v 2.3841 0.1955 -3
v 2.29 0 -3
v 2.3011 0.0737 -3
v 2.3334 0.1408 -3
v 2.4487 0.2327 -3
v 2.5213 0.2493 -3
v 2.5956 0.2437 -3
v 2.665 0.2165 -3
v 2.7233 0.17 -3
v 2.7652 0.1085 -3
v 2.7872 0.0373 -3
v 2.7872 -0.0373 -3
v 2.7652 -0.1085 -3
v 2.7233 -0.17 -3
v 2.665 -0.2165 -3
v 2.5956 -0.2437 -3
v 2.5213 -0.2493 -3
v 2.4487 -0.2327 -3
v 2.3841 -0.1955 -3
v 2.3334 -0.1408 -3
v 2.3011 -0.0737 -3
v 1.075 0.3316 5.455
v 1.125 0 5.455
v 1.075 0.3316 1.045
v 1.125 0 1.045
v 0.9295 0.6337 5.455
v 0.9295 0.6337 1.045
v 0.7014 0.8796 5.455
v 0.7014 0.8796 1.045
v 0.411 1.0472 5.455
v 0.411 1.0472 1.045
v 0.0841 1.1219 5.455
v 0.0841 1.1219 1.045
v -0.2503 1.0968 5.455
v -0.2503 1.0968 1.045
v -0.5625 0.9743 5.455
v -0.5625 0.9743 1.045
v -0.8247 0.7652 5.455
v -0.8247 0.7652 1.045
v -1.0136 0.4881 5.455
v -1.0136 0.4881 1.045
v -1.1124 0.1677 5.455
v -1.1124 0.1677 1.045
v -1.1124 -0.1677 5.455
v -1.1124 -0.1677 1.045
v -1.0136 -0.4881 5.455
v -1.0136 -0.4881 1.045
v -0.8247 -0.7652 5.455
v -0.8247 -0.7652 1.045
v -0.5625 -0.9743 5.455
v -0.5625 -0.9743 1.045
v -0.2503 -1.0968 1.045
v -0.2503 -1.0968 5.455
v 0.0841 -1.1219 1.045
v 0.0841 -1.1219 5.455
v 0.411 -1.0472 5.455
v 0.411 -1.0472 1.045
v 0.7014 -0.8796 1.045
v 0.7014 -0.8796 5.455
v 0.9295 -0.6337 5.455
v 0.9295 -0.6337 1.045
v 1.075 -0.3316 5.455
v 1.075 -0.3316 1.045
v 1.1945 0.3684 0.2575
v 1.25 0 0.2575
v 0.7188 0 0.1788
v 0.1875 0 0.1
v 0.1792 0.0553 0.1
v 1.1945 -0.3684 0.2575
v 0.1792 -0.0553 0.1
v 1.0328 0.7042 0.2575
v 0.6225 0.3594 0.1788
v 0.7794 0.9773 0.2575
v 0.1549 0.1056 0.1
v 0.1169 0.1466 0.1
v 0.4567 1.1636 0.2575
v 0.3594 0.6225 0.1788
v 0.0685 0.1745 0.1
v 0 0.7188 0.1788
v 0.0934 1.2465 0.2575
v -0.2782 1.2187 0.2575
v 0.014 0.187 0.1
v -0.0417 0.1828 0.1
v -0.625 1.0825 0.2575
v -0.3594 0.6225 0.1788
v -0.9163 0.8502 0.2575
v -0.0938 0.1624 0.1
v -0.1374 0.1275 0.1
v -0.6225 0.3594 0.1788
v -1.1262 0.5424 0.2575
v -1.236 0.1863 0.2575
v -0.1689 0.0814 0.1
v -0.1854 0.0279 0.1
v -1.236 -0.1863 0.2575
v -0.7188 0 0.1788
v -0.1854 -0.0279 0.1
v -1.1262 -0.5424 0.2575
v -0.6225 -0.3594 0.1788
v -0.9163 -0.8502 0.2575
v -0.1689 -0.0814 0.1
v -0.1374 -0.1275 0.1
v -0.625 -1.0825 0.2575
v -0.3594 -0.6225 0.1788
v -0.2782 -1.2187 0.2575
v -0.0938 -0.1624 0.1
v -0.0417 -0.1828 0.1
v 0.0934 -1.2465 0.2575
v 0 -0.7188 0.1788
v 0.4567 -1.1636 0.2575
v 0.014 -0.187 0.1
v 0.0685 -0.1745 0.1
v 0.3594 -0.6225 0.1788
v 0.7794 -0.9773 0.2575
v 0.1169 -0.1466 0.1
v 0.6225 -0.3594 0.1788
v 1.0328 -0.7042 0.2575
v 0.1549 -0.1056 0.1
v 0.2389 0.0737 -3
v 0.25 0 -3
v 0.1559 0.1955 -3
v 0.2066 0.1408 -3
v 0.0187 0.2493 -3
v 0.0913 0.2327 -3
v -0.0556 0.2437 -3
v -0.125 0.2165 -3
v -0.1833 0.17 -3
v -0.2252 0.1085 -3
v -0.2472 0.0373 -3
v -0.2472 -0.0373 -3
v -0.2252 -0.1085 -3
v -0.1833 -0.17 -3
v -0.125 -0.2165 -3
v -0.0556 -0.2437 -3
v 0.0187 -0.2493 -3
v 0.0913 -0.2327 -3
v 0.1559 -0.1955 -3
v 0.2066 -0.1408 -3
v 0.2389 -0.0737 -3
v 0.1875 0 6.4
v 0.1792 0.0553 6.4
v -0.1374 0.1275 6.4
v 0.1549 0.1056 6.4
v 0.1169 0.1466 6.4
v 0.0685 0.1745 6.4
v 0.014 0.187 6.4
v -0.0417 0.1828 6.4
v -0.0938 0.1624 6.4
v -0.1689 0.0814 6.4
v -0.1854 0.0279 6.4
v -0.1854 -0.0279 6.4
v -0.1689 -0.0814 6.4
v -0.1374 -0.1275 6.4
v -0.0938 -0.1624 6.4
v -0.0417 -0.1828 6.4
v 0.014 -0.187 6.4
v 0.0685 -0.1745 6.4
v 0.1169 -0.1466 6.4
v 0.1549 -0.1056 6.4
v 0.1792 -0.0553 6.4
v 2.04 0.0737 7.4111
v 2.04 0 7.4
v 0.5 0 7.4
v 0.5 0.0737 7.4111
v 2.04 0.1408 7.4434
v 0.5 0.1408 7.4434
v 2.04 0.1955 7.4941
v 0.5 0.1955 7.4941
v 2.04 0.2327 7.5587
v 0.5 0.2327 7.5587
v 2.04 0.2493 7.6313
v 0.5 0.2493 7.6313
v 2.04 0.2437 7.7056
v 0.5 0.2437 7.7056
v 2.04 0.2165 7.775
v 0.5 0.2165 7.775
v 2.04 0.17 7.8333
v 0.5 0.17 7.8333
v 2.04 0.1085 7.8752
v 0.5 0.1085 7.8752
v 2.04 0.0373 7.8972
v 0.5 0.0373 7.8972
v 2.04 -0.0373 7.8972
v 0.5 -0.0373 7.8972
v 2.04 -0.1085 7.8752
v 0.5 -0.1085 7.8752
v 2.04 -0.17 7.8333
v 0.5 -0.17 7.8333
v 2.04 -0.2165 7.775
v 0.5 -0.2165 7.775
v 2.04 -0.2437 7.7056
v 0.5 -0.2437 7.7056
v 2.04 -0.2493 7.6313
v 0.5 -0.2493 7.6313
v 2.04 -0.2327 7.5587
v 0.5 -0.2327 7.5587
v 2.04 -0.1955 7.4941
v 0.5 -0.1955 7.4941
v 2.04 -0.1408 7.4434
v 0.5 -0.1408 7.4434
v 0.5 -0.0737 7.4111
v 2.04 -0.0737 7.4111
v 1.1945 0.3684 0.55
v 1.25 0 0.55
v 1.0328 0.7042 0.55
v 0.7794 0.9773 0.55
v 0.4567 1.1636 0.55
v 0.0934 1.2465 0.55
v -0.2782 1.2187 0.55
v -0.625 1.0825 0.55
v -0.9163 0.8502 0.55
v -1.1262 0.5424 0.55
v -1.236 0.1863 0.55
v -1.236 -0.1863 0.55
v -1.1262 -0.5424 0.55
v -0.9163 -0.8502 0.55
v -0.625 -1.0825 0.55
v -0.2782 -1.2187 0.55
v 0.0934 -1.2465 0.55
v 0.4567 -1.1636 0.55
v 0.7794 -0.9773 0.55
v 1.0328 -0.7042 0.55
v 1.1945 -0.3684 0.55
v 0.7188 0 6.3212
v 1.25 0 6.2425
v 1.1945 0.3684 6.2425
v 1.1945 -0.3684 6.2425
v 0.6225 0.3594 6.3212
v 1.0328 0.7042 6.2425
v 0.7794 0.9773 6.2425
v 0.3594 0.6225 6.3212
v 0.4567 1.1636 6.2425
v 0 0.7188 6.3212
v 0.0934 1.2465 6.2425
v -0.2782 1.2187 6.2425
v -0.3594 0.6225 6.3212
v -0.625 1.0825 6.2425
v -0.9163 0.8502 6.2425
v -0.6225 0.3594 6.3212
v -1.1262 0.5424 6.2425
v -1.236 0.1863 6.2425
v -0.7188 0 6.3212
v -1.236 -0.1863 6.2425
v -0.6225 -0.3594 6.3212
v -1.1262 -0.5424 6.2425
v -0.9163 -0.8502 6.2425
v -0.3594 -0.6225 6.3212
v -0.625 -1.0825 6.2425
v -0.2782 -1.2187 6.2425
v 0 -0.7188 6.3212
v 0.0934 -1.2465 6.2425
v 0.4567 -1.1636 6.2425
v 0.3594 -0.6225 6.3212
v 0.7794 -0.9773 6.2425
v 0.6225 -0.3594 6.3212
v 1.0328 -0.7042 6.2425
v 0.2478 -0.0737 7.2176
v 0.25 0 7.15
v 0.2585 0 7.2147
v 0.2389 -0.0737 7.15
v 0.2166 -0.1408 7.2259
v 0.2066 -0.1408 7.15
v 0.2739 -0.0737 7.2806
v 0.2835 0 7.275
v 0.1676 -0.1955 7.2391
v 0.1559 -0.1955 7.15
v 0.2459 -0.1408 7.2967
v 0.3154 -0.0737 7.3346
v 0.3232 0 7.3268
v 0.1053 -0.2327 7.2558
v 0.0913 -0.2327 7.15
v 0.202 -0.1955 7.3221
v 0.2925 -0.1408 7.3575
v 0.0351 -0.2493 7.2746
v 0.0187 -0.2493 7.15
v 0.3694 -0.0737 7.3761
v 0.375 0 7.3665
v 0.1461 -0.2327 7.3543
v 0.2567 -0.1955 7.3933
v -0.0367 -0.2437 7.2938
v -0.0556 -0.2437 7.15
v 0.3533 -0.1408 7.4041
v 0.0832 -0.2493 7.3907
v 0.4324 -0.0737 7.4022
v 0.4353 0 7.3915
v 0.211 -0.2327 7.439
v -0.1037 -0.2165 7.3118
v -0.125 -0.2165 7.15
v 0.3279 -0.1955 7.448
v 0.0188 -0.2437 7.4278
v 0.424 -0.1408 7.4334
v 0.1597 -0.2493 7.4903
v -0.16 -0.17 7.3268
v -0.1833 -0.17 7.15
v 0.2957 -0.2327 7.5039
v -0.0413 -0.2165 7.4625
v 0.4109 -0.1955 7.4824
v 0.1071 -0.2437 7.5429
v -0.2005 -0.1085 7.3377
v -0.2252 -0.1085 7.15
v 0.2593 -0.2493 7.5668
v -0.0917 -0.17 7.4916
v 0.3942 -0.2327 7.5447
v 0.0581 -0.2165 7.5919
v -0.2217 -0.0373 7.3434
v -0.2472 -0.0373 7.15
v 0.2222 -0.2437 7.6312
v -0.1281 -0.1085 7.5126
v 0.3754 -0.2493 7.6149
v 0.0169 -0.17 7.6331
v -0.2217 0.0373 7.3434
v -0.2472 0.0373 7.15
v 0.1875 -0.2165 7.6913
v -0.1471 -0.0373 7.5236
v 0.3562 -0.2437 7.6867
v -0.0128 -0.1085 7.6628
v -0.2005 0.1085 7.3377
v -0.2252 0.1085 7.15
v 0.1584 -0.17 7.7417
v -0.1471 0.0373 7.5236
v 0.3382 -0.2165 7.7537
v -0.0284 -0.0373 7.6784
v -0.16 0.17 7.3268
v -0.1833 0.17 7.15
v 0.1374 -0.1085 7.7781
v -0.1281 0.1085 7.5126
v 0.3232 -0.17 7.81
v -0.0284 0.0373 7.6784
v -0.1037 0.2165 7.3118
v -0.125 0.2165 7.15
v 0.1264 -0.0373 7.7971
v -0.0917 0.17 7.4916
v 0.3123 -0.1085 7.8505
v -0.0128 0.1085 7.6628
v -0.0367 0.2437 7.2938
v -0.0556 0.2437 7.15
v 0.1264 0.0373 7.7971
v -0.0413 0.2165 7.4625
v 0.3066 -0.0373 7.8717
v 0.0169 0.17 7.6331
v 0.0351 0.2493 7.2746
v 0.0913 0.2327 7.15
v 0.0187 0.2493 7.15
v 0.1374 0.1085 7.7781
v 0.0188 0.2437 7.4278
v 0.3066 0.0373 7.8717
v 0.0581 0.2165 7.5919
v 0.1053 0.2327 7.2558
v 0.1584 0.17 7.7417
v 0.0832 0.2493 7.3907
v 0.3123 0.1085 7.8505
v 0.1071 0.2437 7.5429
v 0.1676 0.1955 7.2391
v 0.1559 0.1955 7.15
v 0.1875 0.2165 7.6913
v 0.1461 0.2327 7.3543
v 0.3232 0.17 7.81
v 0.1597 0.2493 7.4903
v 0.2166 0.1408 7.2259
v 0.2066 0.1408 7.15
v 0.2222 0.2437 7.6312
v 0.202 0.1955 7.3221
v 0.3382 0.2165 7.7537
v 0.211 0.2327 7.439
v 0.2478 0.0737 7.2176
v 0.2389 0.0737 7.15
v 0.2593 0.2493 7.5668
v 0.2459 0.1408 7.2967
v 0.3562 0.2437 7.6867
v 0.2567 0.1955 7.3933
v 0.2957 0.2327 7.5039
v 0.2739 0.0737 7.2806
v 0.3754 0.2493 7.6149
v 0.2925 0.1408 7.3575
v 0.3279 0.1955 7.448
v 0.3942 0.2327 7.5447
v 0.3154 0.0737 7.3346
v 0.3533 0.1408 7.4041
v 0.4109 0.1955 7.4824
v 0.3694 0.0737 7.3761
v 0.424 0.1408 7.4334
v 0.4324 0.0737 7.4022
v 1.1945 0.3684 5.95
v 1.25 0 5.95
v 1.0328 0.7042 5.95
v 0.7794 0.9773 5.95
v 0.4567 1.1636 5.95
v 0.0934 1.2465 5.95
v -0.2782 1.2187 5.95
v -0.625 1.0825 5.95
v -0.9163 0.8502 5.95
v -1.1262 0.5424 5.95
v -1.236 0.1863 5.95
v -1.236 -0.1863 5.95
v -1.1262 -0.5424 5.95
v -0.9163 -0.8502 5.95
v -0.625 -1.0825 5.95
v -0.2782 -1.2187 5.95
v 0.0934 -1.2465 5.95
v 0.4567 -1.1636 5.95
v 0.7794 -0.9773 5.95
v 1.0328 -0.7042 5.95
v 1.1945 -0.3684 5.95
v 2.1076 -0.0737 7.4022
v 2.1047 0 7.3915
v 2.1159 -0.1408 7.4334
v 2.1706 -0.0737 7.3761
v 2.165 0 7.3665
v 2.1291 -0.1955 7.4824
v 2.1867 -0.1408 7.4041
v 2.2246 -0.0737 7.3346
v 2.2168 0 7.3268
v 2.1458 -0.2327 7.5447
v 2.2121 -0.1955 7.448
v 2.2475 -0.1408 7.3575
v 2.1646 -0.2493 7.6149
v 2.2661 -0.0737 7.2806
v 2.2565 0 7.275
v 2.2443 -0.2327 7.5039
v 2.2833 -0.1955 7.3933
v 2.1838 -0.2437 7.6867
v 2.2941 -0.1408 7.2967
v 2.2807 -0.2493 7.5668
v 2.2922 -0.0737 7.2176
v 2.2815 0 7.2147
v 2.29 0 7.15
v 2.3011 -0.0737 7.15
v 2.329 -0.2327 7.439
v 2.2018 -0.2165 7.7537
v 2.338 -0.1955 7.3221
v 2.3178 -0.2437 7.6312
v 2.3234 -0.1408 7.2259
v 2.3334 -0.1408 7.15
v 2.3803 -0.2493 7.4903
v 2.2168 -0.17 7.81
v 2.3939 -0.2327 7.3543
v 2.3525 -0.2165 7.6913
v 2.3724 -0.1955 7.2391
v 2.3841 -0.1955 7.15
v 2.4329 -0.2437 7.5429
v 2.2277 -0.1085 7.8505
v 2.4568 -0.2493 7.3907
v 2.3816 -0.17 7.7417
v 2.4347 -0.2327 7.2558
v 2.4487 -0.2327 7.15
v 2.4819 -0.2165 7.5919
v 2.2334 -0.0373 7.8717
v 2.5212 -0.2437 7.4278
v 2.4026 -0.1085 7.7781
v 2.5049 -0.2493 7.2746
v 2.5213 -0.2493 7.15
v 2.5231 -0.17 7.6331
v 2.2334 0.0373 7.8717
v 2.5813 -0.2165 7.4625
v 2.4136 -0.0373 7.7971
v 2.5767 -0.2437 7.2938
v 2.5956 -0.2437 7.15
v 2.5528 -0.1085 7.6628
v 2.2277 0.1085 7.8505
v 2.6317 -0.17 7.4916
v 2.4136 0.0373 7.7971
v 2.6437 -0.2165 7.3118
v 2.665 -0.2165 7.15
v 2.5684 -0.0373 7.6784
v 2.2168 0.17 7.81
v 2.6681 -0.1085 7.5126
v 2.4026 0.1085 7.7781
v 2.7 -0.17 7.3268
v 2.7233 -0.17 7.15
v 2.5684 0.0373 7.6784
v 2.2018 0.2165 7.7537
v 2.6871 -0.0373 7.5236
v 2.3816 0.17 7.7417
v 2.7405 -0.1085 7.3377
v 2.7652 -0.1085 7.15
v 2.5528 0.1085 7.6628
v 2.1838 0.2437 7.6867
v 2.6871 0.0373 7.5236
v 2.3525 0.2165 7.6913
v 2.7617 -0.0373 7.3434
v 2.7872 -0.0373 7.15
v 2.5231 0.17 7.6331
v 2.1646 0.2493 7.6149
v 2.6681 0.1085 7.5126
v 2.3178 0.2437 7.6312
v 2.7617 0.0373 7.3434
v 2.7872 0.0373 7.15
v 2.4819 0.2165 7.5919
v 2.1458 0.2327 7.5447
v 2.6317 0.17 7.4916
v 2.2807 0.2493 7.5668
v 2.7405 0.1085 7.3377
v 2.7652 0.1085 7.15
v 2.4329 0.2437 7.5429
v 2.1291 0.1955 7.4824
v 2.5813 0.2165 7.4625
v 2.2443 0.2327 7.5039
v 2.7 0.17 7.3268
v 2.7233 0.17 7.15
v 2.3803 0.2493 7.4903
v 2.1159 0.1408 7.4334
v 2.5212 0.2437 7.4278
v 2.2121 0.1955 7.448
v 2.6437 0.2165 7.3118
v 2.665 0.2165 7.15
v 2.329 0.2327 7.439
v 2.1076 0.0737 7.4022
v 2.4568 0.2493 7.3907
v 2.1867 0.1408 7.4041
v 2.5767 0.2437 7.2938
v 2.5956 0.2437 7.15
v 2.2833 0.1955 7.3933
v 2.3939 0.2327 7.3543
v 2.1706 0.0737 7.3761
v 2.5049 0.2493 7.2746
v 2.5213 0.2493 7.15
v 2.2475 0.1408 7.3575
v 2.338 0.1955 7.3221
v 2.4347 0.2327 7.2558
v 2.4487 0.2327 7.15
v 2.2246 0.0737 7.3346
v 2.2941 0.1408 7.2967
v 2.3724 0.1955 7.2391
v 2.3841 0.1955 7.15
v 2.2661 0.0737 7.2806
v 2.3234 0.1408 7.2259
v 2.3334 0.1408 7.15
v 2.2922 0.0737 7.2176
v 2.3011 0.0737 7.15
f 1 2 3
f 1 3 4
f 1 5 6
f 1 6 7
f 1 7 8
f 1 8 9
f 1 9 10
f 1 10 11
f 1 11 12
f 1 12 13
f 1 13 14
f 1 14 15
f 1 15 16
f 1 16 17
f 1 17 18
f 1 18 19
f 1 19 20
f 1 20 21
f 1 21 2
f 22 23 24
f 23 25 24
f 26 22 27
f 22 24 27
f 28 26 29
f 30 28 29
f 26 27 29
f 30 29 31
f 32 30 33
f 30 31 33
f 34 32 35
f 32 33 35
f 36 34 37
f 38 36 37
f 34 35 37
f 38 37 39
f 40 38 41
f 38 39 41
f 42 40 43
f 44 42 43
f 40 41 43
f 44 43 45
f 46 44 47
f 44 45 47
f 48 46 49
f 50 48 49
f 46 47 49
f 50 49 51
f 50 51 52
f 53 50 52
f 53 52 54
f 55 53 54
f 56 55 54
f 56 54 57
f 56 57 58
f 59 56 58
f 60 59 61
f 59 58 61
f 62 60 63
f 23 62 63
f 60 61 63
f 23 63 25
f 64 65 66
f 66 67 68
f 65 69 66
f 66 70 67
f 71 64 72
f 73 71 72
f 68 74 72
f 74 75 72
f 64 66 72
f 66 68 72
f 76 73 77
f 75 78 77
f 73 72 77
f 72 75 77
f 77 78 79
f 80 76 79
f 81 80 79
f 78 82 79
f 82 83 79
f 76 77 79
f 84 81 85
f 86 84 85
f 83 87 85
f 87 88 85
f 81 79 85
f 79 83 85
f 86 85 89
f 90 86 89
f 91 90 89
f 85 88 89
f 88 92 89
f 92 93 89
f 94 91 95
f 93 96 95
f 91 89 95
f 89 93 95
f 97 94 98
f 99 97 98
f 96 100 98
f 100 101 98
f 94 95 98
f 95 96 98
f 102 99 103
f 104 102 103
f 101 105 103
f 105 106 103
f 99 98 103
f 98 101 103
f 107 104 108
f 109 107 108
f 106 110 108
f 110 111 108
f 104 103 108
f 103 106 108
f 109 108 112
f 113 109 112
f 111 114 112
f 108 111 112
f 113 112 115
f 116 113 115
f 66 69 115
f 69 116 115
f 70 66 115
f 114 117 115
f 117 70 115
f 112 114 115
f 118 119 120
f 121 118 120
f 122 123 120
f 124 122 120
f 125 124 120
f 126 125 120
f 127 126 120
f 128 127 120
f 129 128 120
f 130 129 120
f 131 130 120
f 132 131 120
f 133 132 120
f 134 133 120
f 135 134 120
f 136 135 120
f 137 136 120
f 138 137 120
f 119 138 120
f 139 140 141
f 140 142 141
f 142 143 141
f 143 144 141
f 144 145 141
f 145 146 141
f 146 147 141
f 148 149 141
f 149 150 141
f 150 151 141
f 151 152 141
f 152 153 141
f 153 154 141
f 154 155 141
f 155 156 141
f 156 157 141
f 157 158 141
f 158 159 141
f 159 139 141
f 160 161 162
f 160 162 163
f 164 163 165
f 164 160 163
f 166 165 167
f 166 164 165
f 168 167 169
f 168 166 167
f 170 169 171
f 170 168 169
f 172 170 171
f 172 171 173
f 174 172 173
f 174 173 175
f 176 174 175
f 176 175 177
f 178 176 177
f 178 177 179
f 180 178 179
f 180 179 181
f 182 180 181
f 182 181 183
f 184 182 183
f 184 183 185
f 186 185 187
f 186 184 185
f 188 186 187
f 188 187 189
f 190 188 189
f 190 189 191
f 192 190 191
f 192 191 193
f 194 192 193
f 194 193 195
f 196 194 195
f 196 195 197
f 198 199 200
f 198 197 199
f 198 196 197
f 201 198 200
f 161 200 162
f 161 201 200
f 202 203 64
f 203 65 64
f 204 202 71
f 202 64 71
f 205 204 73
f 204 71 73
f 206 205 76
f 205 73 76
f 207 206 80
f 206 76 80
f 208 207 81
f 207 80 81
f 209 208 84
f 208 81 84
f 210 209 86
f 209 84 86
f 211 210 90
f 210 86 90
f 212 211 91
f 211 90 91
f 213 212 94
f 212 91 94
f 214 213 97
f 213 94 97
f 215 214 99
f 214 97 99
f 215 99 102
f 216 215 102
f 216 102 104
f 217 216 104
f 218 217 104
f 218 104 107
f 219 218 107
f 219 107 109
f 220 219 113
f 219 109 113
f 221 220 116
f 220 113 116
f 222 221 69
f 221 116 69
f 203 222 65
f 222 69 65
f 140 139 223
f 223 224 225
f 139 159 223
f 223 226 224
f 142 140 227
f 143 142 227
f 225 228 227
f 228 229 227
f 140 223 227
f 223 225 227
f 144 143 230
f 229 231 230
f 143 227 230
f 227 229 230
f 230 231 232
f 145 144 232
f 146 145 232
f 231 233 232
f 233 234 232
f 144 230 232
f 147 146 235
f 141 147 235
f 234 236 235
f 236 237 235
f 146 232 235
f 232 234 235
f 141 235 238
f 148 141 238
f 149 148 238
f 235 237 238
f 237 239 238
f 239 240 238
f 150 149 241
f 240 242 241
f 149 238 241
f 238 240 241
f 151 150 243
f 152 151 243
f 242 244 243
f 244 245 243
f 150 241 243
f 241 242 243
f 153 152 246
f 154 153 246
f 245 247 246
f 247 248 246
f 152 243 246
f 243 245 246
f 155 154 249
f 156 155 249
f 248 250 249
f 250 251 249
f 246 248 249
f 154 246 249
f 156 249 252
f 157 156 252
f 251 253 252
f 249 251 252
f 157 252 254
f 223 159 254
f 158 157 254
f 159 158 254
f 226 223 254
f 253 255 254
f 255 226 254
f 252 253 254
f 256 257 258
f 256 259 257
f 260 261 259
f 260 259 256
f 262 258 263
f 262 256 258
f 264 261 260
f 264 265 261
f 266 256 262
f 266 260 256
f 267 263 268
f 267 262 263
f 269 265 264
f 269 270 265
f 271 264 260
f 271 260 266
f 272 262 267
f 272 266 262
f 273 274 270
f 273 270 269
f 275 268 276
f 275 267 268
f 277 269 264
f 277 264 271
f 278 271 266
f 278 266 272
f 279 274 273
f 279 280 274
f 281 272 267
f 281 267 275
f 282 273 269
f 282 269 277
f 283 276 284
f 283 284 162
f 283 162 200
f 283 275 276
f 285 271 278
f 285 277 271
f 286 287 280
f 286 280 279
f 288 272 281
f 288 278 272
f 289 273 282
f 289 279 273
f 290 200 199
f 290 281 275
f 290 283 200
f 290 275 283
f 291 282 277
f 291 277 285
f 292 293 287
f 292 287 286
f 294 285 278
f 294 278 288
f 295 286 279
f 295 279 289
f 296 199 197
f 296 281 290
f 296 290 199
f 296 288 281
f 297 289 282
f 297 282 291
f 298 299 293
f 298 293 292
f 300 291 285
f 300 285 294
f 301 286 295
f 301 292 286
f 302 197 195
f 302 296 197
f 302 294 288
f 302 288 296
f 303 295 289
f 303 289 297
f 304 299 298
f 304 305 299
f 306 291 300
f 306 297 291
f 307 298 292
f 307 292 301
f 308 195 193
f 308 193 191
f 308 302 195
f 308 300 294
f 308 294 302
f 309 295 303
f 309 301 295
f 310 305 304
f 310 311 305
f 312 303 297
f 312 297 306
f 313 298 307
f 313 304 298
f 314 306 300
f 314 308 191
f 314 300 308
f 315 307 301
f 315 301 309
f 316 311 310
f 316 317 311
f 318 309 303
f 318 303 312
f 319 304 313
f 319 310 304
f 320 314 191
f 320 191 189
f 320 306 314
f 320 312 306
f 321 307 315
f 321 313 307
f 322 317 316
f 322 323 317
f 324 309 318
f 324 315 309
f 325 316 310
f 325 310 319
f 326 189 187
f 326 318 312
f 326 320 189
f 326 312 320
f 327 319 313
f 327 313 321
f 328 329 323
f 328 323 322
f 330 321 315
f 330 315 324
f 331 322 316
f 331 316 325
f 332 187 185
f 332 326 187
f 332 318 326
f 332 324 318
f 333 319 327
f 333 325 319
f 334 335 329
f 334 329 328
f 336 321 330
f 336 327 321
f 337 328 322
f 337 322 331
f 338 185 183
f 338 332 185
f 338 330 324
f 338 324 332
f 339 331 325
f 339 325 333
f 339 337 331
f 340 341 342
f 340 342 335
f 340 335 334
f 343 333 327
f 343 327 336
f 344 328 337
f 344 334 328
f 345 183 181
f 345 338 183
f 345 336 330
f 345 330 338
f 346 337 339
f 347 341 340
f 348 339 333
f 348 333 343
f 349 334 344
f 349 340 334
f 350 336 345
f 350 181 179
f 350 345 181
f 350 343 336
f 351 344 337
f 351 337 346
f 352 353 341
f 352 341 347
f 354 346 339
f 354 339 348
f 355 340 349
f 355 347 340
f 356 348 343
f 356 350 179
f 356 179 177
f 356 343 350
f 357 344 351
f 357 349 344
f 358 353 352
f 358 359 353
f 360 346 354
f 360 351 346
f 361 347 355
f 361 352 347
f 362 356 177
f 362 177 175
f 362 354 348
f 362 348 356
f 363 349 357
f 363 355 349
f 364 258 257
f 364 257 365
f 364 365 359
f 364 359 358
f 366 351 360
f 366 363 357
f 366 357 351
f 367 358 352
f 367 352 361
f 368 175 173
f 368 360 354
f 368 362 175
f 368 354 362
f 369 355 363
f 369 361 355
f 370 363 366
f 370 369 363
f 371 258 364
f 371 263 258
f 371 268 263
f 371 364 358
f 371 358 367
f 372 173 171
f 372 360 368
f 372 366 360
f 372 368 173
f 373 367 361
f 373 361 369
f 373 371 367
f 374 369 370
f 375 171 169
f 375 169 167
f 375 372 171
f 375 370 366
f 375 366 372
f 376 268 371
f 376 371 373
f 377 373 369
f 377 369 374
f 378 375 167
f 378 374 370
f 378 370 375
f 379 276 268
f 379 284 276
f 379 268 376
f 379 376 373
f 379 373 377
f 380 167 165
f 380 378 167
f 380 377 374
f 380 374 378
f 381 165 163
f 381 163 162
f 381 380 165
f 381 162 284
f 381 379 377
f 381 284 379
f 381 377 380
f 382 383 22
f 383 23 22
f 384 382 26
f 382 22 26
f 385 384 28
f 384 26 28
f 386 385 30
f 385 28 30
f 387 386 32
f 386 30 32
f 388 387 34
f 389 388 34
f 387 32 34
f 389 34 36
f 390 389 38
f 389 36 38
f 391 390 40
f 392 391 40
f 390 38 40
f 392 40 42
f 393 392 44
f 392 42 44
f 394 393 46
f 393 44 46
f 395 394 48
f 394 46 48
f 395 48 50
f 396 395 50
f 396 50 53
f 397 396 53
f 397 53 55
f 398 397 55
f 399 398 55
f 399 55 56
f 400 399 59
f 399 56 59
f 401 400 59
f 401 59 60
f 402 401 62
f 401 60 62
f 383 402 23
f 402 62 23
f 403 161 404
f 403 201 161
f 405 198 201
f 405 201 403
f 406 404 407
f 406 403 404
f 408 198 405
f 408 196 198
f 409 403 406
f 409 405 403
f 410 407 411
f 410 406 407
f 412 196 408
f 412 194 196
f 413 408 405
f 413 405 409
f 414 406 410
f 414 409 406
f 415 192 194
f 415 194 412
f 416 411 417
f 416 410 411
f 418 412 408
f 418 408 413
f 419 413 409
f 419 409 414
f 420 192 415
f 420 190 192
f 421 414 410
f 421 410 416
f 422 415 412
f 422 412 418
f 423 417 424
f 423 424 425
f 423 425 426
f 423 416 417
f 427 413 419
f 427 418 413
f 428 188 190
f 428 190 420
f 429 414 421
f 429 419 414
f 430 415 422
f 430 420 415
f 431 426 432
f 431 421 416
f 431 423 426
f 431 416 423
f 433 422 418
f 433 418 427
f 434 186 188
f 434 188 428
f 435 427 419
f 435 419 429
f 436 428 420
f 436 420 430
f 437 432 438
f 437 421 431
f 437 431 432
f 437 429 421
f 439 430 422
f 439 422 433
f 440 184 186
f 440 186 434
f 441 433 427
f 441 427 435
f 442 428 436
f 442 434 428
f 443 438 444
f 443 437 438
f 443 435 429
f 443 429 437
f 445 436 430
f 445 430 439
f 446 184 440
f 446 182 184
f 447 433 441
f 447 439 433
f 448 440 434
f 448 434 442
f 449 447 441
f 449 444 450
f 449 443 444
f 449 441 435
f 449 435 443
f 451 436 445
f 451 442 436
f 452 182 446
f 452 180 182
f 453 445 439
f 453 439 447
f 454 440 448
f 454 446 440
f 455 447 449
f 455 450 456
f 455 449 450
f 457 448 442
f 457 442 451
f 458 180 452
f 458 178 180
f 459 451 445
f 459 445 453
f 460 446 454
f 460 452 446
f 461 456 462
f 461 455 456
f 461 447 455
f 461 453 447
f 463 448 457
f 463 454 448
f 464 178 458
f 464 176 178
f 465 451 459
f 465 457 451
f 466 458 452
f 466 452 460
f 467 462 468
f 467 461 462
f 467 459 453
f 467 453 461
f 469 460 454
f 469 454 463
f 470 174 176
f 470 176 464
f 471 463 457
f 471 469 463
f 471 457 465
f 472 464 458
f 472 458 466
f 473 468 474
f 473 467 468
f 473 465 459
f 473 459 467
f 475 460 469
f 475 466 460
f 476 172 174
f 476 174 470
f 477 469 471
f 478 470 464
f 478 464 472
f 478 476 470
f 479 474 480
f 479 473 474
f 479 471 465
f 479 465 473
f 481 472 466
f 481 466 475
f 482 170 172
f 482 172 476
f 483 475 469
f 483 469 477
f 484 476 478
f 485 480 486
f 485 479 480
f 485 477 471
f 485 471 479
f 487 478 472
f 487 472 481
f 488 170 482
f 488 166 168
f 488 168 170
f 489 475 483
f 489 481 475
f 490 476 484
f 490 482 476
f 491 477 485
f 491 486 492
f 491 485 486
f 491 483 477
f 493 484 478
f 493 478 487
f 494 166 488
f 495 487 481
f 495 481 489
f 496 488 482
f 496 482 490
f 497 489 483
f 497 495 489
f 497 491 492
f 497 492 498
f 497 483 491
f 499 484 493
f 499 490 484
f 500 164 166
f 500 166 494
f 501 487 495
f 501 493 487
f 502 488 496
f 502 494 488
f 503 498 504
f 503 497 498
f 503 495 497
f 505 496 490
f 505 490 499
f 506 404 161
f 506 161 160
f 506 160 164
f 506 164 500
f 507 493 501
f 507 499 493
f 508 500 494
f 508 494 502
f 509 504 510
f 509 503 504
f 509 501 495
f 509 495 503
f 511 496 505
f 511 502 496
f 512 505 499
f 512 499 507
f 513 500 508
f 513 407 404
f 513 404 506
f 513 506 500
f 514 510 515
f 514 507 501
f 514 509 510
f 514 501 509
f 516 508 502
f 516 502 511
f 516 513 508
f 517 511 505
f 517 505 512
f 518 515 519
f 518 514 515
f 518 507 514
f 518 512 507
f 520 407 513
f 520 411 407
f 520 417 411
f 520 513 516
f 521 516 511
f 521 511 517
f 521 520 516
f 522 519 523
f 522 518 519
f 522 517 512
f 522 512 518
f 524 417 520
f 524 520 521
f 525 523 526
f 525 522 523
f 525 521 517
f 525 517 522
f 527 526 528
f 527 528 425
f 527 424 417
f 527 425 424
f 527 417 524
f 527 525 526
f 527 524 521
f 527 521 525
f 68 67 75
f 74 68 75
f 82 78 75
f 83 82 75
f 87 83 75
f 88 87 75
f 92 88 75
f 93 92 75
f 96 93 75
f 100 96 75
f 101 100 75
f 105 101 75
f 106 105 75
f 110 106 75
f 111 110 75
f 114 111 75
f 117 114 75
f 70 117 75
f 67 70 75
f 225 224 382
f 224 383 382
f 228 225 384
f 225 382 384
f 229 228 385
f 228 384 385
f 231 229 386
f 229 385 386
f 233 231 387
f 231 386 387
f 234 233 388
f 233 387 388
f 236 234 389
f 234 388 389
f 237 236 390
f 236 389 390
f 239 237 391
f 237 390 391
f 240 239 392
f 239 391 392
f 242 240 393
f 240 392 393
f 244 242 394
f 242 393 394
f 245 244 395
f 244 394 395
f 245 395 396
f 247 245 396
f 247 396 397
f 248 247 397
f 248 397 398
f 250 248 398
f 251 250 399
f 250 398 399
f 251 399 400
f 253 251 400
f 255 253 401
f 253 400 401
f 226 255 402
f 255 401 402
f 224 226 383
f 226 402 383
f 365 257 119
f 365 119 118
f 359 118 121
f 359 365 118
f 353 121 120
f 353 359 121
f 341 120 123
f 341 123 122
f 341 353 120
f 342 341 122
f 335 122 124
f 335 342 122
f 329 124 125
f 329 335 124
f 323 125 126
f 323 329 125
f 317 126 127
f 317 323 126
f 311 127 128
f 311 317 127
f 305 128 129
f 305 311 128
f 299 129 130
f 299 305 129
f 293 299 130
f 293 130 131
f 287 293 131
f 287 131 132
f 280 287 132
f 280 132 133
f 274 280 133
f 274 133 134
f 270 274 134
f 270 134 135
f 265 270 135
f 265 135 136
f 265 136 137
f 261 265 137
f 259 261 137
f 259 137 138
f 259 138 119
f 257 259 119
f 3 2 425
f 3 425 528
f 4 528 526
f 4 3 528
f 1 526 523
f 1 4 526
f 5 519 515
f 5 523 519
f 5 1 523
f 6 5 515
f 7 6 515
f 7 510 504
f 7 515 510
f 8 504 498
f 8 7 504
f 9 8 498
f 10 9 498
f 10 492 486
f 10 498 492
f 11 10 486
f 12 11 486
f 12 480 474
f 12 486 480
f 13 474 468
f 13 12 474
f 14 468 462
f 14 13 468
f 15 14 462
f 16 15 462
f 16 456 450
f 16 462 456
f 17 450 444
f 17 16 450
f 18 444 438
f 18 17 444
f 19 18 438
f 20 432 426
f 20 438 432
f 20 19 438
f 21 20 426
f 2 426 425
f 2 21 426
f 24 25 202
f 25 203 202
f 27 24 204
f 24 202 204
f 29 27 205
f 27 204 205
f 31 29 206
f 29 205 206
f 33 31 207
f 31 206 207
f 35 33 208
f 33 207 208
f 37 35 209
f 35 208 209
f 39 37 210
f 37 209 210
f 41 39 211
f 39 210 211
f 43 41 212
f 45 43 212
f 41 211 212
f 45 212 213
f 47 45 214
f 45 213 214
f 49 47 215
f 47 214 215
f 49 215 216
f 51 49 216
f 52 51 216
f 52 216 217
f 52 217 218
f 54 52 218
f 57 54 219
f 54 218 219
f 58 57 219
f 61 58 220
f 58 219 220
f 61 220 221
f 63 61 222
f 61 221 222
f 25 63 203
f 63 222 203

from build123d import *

# Parameters (mm, degrees)
SKETCH_R = 0.25


with BuildPart() as sweep_body:
    # Sweep: sweep along a path in Sketch001
    with BuildLine(Plane.XZ) as sweep_path:
        Line((0, -3), (0, 7.15))
        ThreePointArc((0, 7.15), (0.146445, 7.503551), (0.499994, 7.65))
        Line((0.499994, 7.65), (2.04, 7.65))
        ThreePointArc((2.04, 7.65), (2.393553, 7.503553), (2.54, 7.15))
        Line((2.54, 7.15), (2.54, -3))
    # Sketch → Sweep (sweep)
    with BuildSketch(Plane.XY.offset(-2)):
        Circle(SKETCH_R)
    sweep(path=sweep_path.line)


with BuildPart() as revolution:
    # Sketch002 → Revolution (revolve)
    with BuildSketch(Plane.XZ):
        Polygon((0, 0.1), (0, 6.4), (0.1875, 6.4), (1.25, 6.2425), (1.25, 5.95), (1.125, 5.455), (1.125, 1.045), (1.25, 0.55), (1.25, 0.2575), (0.1875, 0.1), align=None)
    revolve(axis=Axis((0, 0, 0), (0, 0, 1)))


solid = Compound([sweep_body.part, revolution.part])
